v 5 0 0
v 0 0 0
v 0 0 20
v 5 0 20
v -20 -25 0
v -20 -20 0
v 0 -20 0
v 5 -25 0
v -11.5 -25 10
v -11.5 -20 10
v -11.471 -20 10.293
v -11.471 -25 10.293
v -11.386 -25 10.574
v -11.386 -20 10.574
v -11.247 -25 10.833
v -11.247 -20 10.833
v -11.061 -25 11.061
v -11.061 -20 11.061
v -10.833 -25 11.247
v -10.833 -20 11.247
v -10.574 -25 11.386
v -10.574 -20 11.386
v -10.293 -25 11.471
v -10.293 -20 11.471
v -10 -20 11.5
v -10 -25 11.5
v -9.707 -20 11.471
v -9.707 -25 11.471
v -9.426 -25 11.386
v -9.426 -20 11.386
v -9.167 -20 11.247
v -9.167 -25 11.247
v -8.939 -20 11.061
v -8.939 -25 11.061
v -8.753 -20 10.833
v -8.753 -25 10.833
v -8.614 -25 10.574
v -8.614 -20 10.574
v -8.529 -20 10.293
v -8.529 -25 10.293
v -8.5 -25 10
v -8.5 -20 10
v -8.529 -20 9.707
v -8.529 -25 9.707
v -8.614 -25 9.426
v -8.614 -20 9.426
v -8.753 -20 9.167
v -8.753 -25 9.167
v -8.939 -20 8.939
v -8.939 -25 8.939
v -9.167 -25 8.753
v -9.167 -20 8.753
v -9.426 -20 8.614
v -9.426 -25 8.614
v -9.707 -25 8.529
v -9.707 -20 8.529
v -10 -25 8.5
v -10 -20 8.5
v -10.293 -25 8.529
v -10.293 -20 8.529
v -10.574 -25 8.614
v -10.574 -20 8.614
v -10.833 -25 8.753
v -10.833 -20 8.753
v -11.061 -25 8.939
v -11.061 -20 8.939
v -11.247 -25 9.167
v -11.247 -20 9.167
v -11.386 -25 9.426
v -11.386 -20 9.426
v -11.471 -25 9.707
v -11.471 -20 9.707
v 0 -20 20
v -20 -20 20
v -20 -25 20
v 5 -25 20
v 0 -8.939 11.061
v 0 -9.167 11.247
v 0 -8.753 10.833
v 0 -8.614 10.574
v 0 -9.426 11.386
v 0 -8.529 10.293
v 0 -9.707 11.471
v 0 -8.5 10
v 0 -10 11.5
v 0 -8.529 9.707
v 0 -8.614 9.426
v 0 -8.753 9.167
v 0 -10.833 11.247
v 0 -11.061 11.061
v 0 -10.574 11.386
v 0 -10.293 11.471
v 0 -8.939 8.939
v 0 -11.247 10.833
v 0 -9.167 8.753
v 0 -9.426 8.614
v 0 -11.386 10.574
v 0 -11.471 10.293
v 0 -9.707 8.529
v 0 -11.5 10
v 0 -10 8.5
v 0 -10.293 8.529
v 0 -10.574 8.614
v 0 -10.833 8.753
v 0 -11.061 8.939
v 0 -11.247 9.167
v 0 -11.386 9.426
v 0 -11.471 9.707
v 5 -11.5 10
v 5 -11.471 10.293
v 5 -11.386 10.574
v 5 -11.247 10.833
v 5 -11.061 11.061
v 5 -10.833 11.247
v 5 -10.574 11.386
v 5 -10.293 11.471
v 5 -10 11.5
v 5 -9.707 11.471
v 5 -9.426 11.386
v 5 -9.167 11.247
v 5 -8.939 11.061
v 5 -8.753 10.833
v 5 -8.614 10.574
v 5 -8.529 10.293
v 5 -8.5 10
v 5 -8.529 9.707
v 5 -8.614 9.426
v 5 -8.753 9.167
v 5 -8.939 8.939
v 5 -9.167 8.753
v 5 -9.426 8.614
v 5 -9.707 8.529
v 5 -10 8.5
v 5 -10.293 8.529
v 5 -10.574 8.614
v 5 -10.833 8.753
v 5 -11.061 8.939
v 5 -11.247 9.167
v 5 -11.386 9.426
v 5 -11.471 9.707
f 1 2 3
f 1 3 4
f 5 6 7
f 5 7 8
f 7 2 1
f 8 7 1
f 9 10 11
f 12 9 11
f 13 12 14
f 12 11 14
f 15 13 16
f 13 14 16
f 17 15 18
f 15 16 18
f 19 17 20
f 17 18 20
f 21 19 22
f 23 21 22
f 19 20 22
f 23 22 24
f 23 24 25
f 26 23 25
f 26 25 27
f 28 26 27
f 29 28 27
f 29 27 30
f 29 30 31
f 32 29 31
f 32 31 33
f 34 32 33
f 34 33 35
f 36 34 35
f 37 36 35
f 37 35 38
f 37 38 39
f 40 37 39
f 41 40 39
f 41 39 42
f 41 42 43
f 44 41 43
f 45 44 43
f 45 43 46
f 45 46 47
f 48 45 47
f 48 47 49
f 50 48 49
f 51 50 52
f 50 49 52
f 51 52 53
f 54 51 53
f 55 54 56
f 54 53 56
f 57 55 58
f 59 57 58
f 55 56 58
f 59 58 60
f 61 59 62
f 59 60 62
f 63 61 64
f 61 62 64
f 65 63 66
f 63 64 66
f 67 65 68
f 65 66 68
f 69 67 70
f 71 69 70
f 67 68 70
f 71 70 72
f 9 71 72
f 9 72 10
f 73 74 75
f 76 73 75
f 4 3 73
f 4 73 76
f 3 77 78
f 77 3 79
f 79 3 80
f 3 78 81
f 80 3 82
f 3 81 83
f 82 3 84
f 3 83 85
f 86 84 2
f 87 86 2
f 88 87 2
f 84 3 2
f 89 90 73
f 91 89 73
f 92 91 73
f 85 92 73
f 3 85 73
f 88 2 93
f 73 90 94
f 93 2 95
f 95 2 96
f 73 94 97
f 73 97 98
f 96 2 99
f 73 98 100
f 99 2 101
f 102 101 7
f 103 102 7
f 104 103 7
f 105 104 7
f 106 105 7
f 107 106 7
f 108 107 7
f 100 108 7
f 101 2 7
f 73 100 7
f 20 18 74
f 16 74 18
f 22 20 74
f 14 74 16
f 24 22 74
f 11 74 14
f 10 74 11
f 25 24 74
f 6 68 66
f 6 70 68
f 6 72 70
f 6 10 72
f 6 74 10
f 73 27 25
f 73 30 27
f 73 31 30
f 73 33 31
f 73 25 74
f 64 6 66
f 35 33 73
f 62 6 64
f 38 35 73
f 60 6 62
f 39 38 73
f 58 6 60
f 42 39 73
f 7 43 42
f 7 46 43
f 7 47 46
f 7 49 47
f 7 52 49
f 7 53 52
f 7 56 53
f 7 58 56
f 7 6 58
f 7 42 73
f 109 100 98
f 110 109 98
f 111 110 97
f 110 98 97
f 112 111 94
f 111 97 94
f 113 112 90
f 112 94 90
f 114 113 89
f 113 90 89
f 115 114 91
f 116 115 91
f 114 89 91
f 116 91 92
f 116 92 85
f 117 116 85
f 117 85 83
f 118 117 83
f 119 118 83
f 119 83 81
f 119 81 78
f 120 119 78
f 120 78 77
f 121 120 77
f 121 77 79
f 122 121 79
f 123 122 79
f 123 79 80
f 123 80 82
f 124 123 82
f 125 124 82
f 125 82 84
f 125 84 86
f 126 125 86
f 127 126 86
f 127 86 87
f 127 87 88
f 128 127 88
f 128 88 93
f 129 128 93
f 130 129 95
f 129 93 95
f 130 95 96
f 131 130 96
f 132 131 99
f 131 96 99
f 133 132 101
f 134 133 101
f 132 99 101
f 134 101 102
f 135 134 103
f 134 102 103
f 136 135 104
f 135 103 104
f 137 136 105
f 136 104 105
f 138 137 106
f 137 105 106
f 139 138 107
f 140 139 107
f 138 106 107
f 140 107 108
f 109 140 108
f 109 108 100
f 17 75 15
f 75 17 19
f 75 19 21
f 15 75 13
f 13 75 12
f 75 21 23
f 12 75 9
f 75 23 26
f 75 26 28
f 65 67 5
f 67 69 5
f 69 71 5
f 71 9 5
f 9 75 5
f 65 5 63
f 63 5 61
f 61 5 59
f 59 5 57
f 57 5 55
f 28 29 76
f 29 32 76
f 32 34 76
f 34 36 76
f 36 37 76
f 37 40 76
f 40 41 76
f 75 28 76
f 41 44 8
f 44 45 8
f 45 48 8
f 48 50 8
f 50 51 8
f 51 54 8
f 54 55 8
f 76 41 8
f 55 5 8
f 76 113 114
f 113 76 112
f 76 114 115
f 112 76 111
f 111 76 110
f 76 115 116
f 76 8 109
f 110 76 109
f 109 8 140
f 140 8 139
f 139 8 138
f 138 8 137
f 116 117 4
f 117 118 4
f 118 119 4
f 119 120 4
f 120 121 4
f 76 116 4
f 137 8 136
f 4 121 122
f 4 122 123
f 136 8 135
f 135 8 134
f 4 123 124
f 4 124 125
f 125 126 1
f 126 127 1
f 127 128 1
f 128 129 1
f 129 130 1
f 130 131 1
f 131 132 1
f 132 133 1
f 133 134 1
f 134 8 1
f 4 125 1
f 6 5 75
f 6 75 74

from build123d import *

# Parameters (mm, degrees)
SKETCH_1_W          = 5
SKETCH_1_H          = 20
SKETCH_1_H_2        = 5
SKETCH_1_W_2        = 20
EXTRUDE_1_DEPTH     = 20
CUT_EXTRUDE_1_REACH = 36.641
SKETCH_2_R          = 1.5
CUT_EXTRUDE_2_REACH = 39.749
SKETCH_3_R          = 1.5


with BuildPart() as part:
    # 草图1 → 凸台-拉伸1 (new body)
    with BuildSketch(Plane.XY):
        with Locations((2.5, -10)):
            Rectangle(SKETCH_1_W, SKETCH_1_H)
        with Locations((2.5, -22.5)):
            Rectangle(SKETCH_1_W, SKETCH_1_H_2)
        with Locations((-10, -22.5)):
            Rectangle(SKETCH_1_W_2, SKETCH_1_H_2)
    extrude(amount=EXTRUDE_1_DEPTH)

    # 草图2 → 切除-拉伸1 (cut, up to next)
    with BuildSketch(Plane(origin=(0, -20, 0), x_dir=(1, 0, 0), z_dir=(0, 1, 0)), mode=Mode.PRIVATE) as cut_extrude_1_sk1:
        with Locations(Location((-10, -10, 0), (0, 0, 180))):
            Circle(SKETCH_2_R)
    cut_extrude_1_tool1 = extrude(cut_extrude_1_sk1.sketch, amount=-CUT_EXTRUDE_1_REACH, mode=Mode.PRIVATE) & part.part
    add(cut_extrude_1_tool1.solids().sort_by_distance((-10, -20, 10))[0], mode=Mode.SUBTRACT)

    # 草图3 → 切除-拉伸2 (cut, up to next)
    with BuildSketch(Plane.ZY, mode=Mode.PRIVATE) as cut_extrude_2_sk1:
        with Locations(Location((10, -10, 0), (0, 0, 270))):
            Circle(SKETCH_3_R)
    cut_extrude_2_tool1 = extrude(cut_extrude_2_sk1.sketch, amount=-CUT_EXTRUDE_2_REACH, mode=Mode.PRIVATE) & part.part
    add(cut_extrude_2_tool1.solids().sort_by_distance((0, -10, 10))[0], mode=Mode.SUBTRACT)


solid = part.part
